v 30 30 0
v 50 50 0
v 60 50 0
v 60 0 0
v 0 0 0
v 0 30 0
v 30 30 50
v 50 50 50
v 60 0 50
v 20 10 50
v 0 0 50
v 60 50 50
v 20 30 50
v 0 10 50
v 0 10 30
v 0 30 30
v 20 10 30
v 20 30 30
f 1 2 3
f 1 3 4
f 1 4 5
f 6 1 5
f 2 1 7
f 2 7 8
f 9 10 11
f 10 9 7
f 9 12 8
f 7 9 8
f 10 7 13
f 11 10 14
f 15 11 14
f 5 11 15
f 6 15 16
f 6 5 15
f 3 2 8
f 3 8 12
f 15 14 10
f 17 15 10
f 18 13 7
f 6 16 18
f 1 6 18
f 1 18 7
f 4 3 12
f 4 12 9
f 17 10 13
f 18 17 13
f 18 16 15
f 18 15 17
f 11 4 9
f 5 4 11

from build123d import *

# Parameters (mm, degrees)
BOSS_EXTRUDE2_DEPTH = 50
SKETCH3_W           = 20
SKETCH3_H           = 20
CUT_EXTRUDE2_DEPTH  = 20


with BuildPart() as part:
    # Sketch1 → Boss-Extrude2 (new body)
    with BuildSketch(Plane.XY):
        Polygon((0, 0), (0, 30), (30, 30), (50, 50), (60, 50), (60, 0), align=None)
    extrude(amount=BOSS_EXTRUDE2_DEPTH)

    # Sketch3 → Cut-Extrude2 (cut)
    with BuildSketch(Plane.XY.offset(50)):
        with Locations((10, 20)):
            Rectangle(SKETCH3_W, SKETCH3_H)
    extrude(amount=-CUT_EXTRUDE2_DEPTH, mode=Mode.SUBTRACT)


solid = part.part
